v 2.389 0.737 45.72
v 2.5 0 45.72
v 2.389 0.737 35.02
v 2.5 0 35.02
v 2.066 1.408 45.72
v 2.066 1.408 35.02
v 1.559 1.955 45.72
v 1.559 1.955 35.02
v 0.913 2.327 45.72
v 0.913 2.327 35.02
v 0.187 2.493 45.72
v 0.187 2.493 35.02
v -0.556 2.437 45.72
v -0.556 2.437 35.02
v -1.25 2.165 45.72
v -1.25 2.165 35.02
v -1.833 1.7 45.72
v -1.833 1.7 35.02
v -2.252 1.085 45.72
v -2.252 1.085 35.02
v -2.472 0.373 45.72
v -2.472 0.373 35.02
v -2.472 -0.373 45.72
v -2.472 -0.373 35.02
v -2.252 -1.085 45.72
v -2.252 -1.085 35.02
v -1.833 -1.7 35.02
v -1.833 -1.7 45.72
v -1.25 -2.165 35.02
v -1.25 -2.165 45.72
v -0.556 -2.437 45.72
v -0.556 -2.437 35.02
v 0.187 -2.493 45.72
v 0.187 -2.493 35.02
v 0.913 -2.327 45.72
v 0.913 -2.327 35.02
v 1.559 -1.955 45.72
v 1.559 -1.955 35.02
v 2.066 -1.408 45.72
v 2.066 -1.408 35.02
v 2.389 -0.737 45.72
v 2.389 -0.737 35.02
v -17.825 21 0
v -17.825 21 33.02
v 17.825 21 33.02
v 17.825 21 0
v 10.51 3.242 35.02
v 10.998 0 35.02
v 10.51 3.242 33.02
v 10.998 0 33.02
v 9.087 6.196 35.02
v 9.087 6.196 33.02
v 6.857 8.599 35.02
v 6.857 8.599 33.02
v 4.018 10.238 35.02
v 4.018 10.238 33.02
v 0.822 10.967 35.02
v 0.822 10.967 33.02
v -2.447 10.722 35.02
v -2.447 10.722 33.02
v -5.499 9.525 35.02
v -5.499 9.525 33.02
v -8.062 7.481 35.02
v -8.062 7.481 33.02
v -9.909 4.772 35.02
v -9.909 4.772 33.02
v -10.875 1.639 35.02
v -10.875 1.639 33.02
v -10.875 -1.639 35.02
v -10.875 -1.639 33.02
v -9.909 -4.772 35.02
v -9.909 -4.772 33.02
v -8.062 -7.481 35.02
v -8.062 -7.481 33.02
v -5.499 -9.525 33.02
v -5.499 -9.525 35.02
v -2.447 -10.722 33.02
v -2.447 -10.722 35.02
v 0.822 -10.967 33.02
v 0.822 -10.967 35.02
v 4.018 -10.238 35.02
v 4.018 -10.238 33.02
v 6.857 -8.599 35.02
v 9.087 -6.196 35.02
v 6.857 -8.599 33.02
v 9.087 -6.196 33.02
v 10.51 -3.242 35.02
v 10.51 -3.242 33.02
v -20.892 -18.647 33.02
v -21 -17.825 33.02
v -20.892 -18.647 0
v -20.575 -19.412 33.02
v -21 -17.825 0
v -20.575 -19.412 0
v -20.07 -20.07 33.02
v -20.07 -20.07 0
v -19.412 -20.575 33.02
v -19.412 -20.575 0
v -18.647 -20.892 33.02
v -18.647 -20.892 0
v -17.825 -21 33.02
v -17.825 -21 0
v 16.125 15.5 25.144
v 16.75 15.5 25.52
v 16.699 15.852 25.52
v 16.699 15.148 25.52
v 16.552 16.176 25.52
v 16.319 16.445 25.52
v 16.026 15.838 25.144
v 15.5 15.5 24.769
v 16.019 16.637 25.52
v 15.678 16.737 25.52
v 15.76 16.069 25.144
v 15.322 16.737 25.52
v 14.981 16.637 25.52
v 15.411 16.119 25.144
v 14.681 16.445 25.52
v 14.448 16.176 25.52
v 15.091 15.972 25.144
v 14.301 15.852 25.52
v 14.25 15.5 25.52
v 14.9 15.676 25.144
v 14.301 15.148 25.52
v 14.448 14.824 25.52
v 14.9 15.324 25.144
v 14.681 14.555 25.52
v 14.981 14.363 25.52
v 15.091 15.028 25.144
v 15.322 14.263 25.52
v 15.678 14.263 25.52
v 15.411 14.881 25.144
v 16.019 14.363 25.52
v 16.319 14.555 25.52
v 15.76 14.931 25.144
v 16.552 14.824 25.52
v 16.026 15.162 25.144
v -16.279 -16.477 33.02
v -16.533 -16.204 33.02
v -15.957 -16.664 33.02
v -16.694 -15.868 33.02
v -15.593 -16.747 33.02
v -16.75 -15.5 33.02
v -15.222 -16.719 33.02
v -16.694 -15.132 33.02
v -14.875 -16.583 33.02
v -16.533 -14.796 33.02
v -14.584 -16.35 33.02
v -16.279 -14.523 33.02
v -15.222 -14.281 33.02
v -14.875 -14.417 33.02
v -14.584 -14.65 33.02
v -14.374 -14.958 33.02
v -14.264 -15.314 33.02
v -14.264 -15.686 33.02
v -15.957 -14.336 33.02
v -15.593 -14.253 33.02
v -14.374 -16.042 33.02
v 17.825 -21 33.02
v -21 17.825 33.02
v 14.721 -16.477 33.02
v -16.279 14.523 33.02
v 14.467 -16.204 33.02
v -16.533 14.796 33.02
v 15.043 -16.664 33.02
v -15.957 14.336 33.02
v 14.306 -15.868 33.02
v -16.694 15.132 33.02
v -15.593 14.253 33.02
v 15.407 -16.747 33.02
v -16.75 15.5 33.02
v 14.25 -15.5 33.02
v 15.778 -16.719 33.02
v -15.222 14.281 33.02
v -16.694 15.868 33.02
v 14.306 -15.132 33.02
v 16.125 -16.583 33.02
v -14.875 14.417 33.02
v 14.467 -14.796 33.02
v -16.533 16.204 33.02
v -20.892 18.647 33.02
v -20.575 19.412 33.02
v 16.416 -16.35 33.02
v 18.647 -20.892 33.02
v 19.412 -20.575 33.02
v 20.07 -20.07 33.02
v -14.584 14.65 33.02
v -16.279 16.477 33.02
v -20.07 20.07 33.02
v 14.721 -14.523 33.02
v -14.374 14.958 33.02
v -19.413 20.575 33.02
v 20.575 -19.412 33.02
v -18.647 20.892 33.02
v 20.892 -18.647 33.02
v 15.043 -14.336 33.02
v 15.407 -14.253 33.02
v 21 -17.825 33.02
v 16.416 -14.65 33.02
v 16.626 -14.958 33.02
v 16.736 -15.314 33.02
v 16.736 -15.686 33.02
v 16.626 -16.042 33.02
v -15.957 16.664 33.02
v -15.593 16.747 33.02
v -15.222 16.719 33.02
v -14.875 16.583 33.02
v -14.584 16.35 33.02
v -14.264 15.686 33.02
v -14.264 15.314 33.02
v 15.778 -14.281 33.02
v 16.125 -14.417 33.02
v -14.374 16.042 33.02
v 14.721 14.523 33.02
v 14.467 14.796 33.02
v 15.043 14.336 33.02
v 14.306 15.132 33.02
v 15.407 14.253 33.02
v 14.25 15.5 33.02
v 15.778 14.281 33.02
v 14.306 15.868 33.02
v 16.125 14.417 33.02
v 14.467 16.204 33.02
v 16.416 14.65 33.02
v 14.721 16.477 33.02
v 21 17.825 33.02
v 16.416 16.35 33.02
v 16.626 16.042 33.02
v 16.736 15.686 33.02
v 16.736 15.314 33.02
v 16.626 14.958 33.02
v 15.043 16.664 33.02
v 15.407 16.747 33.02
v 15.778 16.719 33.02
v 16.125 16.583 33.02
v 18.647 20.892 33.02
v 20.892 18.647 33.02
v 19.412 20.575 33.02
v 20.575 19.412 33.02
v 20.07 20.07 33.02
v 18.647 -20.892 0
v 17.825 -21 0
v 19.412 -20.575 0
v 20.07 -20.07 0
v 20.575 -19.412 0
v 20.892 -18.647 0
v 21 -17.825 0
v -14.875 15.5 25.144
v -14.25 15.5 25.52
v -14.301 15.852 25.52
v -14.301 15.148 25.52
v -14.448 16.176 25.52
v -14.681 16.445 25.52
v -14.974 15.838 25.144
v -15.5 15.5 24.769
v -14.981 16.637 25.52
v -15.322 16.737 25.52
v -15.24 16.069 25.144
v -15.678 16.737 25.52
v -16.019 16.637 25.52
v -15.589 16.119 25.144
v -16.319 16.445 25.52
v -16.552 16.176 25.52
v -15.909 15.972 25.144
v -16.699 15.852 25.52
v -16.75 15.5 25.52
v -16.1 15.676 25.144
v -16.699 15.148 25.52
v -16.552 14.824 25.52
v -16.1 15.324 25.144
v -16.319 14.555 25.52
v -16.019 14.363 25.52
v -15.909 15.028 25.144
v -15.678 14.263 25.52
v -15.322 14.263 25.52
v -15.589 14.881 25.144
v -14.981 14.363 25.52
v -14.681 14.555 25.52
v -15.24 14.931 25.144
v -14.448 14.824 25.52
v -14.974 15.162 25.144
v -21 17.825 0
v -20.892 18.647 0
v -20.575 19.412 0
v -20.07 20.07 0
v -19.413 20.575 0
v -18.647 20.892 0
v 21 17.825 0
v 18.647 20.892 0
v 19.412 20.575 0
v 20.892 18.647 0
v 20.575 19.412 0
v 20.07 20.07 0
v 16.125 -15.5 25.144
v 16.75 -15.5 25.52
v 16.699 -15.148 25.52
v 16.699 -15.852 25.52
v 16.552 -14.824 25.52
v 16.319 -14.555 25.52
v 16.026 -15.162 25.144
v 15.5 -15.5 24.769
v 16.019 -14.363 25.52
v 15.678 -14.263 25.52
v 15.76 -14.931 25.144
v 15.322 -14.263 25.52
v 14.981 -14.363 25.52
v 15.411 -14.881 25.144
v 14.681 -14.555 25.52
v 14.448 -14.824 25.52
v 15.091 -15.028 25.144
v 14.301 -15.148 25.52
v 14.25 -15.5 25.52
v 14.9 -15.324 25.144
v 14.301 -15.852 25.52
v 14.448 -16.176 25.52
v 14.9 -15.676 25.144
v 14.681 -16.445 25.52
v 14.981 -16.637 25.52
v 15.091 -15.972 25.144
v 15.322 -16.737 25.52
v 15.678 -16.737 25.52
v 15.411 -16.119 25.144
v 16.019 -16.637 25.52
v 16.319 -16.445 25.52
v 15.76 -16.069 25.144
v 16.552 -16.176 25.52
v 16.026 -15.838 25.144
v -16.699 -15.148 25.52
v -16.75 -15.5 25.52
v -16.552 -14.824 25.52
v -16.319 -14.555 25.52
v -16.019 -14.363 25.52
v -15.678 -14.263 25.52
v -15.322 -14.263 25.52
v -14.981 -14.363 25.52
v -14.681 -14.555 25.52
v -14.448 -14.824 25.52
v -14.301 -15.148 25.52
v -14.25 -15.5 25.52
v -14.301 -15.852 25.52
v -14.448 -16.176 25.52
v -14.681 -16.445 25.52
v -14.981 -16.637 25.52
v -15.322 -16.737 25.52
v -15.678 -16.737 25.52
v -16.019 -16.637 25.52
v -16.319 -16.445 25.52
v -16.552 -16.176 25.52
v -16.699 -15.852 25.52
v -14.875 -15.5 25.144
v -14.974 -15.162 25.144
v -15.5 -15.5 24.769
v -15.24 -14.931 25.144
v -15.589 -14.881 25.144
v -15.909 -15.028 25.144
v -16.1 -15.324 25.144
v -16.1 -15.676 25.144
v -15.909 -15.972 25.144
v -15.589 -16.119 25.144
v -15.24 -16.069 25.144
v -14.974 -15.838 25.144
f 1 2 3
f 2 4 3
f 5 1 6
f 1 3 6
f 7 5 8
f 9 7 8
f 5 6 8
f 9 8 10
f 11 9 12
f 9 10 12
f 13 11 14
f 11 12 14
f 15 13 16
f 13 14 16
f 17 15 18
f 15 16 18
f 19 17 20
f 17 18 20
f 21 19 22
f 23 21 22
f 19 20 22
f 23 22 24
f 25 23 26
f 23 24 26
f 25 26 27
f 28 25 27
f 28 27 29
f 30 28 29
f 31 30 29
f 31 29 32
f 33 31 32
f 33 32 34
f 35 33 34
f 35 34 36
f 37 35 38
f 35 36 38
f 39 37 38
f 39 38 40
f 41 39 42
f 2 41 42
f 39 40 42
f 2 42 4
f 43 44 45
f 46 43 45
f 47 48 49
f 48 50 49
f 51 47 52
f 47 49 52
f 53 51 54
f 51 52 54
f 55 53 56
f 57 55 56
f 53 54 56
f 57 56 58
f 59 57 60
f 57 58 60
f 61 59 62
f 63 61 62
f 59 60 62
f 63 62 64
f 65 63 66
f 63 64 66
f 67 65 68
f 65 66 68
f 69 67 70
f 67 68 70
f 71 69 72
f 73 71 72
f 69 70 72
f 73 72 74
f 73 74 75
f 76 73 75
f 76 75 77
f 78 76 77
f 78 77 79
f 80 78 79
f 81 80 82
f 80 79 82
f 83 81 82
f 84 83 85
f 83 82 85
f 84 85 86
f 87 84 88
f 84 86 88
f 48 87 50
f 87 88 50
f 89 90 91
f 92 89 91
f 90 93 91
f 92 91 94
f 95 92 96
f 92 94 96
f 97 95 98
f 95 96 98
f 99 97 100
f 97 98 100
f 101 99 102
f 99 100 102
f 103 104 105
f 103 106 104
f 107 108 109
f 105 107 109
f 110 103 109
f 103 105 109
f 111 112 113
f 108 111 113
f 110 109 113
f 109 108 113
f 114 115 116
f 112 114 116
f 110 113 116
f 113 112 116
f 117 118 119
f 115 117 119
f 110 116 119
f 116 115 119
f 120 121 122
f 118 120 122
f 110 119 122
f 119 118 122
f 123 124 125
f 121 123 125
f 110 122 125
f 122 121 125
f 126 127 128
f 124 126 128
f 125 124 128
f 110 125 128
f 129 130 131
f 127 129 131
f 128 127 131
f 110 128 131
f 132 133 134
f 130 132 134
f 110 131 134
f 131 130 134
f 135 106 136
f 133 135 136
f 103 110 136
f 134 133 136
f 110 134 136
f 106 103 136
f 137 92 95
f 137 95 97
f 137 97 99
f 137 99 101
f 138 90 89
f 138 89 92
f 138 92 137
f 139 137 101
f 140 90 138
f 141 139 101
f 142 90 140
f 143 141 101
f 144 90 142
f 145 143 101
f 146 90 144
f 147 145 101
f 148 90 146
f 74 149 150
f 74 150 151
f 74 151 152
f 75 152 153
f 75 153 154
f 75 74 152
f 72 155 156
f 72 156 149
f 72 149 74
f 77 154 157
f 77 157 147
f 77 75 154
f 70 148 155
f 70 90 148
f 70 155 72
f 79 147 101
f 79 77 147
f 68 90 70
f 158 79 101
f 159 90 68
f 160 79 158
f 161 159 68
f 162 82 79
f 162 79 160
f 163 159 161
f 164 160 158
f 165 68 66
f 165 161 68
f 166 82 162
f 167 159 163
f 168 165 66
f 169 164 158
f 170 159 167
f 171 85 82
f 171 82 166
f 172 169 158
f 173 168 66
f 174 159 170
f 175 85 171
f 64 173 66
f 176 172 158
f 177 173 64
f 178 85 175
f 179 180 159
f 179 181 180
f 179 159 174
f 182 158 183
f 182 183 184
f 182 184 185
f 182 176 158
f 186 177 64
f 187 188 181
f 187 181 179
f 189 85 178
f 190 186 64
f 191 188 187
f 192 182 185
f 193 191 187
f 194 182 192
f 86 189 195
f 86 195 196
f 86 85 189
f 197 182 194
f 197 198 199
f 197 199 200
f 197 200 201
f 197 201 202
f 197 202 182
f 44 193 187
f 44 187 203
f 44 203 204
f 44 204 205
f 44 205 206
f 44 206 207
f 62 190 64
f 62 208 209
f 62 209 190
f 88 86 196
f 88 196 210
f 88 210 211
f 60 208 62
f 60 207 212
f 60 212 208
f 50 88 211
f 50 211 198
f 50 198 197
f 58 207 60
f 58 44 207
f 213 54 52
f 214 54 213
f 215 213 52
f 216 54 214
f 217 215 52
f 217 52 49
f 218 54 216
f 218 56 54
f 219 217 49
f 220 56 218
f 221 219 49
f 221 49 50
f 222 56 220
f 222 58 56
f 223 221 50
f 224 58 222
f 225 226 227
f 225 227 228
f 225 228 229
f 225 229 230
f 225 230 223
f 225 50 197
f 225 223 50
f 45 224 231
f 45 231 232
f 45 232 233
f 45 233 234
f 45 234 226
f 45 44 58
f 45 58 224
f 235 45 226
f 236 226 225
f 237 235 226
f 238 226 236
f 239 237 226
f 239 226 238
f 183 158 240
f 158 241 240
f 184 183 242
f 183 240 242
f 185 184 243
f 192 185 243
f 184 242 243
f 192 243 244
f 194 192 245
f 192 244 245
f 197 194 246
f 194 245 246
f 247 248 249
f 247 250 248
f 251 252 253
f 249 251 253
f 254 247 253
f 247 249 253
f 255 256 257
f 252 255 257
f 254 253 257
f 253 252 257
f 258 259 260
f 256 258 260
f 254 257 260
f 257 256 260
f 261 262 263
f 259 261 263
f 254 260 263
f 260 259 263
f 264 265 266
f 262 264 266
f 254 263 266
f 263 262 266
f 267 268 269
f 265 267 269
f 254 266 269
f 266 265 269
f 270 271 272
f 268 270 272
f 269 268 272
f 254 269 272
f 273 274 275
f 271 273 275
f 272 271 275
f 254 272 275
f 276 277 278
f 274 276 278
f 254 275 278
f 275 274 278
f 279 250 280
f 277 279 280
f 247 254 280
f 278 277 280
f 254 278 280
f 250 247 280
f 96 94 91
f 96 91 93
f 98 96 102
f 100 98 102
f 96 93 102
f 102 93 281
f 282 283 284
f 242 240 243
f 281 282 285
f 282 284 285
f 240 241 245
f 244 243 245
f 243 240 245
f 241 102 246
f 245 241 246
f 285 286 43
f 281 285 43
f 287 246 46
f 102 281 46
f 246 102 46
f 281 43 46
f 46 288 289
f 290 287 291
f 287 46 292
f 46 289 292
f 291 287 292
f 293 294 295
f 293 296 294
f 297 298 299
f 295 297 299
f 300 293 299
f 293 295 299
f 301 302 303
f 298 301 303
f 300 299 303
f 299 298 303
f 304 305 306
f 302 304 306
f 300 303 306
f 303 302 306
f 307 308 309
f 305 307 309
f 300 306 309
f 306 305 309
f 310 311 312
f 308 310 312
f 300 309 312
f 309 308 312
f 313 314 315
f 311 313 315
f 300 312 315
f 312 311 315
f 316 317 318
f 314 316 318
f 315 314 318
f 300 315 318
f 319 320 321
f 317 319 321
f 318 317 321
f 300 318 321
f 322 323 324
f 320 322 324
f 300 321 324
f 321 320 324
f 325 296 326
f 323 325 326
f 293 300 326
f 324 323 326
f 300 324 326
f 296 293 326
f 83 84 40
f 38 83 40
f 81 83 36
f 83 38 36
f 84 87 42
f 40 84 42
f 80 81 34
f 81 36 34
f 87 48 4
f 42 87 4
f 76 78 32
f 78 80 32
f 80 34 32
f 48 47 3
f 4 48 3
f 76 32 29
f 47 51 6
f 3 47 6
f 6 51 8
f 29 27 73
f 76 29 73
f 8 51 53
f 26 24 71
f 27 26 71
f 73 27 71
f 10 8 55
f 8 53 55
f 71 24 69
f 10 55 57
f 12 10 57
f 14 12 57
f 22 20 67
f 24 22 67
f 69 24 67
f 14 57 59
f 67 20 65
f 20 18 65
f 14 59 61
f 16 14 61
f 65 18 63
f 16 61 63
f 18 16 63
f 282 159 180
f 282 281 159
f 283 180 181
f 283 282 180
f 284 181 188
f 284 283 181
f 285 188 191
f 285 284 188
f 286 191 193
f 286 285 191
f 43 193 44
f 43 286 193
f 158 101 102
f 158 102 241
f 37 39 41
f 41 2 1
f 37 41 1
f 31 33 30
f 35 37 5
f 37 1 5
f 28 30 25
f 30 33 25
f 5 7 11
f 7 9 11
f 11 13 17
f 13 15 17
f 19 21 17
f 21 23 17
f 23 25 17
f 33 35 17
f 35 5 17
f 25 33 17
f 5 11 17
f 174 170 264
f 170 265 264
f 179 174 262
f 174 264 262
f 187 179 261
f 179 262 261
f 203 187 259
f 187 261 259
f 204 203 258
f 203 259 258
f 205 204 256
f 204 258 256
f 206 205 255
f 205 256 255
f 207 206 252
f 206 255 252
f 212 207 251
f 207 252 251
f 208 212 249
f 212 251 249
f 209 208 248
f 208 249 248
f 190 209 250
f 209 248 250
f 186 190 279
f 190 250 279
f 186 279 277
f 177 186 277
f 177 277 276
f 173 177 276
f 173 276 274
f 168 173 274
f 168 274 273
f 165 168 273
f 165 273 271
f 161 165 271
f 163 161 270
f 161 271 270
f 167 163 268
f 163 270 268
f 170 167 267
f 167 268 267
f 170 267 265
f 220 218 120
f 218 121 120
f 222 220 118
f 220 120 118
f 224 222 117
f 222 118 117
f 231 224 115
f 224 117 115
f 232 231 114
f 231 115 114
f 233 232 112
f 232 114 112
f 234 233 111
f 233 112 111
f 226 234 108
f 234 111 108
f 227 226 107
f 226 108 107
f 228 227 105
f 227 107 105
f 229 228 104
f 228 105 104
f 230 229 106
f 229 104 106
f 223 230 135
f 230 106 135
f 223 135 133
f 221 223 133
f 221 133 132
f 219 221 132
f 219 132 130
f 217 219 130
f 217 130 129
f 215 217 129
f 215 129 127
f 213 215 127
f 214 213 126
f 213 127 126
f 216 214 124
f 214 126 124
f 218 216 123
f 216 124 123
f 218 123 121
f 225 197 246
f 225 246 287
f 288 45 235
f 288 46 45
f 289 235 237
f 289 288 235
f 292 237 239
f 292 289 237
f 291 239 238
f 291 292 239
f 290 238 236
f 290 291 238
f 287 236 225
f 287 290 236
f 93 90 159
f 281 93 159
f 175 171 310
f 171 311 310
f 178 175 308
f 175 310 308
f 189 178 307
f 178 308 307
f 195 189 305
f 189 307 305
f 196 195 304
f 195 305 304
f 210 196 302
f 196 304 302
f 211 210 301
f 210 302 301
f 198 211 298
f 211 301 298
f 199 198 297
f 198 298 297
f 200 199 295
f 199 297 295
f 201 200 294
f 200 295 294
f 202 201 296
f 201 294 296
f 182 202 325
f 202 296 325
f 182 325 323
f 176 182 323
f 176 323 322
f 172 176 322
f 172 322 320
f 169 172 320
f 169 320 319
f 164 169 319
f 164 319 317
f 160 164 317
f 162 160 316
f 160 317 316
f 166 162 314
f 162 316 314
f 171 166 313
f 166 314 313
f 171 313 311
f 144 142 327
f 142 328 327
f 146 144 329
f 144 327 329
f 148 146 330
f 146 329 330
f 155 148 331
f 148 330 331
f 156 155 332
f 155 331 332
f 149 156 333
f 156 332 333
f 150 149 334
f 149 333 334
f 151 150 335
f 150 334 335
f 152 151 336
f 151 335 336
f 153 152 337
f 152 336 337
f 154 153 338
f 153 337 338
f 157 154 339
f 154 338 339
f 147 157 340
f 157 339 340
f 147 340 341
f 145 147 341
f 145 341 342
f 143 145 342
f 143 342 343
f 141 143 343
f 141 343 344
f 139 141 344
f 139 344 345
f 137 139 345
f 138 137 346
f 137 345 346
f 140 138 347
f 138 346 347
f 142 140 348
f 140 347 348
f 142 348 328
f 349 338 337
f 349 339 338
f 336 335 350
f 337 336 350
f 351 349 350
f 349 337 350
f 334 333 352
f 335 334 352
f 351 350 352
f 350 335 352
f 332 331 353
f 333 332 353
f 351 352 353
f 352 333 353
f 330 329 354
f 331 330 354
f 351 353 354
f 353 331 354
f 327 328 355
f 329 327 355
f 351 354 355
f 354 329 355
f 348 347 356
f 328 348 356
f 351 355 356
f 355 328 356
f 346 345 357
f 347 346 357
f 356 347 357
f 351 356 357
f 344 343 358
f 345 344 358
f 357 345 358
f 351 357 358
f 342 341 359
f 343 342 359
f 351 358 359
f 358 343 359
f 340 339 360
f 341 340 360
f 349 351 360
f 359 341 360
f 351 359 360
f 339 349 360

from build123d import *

# Parameters (mm, degrees)
SKETCH1_W                 = 42
SKETCH1_H                 = 42
BOSS_EXTRUDE1_DEPTH       = 33.02
M3X0_5_TAPPED_HOLE1_D     = 2.5
M3X0_5_TAPPED_HOLE1_DEPTH = 7.5
M3X0_5_TAPPED_HOLE1_TIP   = 0.751075774
FILLET1_R                 = 3.175


with BuildPart() as part:
    # Sketch1 → Boss-Extrude1 (new body)
    with BuildSketch(Plane.XY.offset(33.02)):
        Rectangle(SKETCH1_W, SKETCH1_H)
    extrude(amount=-BOSS_EXTRUDE1_DEPTH)

    # Sketch6 → Revolve5 (revolve)
    with BuildSketch(Plane(origin=(0, 0, 0), x_dir=(1, 0, 0), z_dir=(0, 1, 0))):
        Polygon((10.9982, -33.02), (0, -33.02), (0, -45.72), (2.5, -45.72), (2.5, -35.02), (10.9982, -35.02), align=None)
    revolve(axis=Axis((0, 0, 33.02), (0, 0, 1)))

    # M3x0.5 Tapped Hole1
    with Locations(Plane.XY.offset(33.02)):
        with Locations((-15.5, 15.5), (-15.5, -15.5), (15.5, -15.5), (15.5, 15.5)):
            Hole(M3X0_5_TAPPED_HOLE1_D / 2, depth=M3X0_5_TAPPED_HOLE1_DEPTH)
            with Locations((0, 0, -(M3X0_5_TAPPED_HOLE1_DEPTH + M3X0_5_TAPPED_HOLE1_TIP / 2))):  # 118° drill point
                Cone(0, M3X0_5_TAPPED_HOLE1_D / 2, M3X0_5_TAPPED_HOLE1_TIP, mode=Mode.SUBTRACT)

    # Fillet1
    fillet1_edges = [part.edges().sort_by_distance(p)[0] for p in [
        (-21, -21, 16.51),
        (-21, 21, 16.51),
        (21, 21, 16.51),
        (21, -21, 16.51),
    ]]
    fillet(fillet1_edges, radius=FILLET1_R)


solid = part.part
